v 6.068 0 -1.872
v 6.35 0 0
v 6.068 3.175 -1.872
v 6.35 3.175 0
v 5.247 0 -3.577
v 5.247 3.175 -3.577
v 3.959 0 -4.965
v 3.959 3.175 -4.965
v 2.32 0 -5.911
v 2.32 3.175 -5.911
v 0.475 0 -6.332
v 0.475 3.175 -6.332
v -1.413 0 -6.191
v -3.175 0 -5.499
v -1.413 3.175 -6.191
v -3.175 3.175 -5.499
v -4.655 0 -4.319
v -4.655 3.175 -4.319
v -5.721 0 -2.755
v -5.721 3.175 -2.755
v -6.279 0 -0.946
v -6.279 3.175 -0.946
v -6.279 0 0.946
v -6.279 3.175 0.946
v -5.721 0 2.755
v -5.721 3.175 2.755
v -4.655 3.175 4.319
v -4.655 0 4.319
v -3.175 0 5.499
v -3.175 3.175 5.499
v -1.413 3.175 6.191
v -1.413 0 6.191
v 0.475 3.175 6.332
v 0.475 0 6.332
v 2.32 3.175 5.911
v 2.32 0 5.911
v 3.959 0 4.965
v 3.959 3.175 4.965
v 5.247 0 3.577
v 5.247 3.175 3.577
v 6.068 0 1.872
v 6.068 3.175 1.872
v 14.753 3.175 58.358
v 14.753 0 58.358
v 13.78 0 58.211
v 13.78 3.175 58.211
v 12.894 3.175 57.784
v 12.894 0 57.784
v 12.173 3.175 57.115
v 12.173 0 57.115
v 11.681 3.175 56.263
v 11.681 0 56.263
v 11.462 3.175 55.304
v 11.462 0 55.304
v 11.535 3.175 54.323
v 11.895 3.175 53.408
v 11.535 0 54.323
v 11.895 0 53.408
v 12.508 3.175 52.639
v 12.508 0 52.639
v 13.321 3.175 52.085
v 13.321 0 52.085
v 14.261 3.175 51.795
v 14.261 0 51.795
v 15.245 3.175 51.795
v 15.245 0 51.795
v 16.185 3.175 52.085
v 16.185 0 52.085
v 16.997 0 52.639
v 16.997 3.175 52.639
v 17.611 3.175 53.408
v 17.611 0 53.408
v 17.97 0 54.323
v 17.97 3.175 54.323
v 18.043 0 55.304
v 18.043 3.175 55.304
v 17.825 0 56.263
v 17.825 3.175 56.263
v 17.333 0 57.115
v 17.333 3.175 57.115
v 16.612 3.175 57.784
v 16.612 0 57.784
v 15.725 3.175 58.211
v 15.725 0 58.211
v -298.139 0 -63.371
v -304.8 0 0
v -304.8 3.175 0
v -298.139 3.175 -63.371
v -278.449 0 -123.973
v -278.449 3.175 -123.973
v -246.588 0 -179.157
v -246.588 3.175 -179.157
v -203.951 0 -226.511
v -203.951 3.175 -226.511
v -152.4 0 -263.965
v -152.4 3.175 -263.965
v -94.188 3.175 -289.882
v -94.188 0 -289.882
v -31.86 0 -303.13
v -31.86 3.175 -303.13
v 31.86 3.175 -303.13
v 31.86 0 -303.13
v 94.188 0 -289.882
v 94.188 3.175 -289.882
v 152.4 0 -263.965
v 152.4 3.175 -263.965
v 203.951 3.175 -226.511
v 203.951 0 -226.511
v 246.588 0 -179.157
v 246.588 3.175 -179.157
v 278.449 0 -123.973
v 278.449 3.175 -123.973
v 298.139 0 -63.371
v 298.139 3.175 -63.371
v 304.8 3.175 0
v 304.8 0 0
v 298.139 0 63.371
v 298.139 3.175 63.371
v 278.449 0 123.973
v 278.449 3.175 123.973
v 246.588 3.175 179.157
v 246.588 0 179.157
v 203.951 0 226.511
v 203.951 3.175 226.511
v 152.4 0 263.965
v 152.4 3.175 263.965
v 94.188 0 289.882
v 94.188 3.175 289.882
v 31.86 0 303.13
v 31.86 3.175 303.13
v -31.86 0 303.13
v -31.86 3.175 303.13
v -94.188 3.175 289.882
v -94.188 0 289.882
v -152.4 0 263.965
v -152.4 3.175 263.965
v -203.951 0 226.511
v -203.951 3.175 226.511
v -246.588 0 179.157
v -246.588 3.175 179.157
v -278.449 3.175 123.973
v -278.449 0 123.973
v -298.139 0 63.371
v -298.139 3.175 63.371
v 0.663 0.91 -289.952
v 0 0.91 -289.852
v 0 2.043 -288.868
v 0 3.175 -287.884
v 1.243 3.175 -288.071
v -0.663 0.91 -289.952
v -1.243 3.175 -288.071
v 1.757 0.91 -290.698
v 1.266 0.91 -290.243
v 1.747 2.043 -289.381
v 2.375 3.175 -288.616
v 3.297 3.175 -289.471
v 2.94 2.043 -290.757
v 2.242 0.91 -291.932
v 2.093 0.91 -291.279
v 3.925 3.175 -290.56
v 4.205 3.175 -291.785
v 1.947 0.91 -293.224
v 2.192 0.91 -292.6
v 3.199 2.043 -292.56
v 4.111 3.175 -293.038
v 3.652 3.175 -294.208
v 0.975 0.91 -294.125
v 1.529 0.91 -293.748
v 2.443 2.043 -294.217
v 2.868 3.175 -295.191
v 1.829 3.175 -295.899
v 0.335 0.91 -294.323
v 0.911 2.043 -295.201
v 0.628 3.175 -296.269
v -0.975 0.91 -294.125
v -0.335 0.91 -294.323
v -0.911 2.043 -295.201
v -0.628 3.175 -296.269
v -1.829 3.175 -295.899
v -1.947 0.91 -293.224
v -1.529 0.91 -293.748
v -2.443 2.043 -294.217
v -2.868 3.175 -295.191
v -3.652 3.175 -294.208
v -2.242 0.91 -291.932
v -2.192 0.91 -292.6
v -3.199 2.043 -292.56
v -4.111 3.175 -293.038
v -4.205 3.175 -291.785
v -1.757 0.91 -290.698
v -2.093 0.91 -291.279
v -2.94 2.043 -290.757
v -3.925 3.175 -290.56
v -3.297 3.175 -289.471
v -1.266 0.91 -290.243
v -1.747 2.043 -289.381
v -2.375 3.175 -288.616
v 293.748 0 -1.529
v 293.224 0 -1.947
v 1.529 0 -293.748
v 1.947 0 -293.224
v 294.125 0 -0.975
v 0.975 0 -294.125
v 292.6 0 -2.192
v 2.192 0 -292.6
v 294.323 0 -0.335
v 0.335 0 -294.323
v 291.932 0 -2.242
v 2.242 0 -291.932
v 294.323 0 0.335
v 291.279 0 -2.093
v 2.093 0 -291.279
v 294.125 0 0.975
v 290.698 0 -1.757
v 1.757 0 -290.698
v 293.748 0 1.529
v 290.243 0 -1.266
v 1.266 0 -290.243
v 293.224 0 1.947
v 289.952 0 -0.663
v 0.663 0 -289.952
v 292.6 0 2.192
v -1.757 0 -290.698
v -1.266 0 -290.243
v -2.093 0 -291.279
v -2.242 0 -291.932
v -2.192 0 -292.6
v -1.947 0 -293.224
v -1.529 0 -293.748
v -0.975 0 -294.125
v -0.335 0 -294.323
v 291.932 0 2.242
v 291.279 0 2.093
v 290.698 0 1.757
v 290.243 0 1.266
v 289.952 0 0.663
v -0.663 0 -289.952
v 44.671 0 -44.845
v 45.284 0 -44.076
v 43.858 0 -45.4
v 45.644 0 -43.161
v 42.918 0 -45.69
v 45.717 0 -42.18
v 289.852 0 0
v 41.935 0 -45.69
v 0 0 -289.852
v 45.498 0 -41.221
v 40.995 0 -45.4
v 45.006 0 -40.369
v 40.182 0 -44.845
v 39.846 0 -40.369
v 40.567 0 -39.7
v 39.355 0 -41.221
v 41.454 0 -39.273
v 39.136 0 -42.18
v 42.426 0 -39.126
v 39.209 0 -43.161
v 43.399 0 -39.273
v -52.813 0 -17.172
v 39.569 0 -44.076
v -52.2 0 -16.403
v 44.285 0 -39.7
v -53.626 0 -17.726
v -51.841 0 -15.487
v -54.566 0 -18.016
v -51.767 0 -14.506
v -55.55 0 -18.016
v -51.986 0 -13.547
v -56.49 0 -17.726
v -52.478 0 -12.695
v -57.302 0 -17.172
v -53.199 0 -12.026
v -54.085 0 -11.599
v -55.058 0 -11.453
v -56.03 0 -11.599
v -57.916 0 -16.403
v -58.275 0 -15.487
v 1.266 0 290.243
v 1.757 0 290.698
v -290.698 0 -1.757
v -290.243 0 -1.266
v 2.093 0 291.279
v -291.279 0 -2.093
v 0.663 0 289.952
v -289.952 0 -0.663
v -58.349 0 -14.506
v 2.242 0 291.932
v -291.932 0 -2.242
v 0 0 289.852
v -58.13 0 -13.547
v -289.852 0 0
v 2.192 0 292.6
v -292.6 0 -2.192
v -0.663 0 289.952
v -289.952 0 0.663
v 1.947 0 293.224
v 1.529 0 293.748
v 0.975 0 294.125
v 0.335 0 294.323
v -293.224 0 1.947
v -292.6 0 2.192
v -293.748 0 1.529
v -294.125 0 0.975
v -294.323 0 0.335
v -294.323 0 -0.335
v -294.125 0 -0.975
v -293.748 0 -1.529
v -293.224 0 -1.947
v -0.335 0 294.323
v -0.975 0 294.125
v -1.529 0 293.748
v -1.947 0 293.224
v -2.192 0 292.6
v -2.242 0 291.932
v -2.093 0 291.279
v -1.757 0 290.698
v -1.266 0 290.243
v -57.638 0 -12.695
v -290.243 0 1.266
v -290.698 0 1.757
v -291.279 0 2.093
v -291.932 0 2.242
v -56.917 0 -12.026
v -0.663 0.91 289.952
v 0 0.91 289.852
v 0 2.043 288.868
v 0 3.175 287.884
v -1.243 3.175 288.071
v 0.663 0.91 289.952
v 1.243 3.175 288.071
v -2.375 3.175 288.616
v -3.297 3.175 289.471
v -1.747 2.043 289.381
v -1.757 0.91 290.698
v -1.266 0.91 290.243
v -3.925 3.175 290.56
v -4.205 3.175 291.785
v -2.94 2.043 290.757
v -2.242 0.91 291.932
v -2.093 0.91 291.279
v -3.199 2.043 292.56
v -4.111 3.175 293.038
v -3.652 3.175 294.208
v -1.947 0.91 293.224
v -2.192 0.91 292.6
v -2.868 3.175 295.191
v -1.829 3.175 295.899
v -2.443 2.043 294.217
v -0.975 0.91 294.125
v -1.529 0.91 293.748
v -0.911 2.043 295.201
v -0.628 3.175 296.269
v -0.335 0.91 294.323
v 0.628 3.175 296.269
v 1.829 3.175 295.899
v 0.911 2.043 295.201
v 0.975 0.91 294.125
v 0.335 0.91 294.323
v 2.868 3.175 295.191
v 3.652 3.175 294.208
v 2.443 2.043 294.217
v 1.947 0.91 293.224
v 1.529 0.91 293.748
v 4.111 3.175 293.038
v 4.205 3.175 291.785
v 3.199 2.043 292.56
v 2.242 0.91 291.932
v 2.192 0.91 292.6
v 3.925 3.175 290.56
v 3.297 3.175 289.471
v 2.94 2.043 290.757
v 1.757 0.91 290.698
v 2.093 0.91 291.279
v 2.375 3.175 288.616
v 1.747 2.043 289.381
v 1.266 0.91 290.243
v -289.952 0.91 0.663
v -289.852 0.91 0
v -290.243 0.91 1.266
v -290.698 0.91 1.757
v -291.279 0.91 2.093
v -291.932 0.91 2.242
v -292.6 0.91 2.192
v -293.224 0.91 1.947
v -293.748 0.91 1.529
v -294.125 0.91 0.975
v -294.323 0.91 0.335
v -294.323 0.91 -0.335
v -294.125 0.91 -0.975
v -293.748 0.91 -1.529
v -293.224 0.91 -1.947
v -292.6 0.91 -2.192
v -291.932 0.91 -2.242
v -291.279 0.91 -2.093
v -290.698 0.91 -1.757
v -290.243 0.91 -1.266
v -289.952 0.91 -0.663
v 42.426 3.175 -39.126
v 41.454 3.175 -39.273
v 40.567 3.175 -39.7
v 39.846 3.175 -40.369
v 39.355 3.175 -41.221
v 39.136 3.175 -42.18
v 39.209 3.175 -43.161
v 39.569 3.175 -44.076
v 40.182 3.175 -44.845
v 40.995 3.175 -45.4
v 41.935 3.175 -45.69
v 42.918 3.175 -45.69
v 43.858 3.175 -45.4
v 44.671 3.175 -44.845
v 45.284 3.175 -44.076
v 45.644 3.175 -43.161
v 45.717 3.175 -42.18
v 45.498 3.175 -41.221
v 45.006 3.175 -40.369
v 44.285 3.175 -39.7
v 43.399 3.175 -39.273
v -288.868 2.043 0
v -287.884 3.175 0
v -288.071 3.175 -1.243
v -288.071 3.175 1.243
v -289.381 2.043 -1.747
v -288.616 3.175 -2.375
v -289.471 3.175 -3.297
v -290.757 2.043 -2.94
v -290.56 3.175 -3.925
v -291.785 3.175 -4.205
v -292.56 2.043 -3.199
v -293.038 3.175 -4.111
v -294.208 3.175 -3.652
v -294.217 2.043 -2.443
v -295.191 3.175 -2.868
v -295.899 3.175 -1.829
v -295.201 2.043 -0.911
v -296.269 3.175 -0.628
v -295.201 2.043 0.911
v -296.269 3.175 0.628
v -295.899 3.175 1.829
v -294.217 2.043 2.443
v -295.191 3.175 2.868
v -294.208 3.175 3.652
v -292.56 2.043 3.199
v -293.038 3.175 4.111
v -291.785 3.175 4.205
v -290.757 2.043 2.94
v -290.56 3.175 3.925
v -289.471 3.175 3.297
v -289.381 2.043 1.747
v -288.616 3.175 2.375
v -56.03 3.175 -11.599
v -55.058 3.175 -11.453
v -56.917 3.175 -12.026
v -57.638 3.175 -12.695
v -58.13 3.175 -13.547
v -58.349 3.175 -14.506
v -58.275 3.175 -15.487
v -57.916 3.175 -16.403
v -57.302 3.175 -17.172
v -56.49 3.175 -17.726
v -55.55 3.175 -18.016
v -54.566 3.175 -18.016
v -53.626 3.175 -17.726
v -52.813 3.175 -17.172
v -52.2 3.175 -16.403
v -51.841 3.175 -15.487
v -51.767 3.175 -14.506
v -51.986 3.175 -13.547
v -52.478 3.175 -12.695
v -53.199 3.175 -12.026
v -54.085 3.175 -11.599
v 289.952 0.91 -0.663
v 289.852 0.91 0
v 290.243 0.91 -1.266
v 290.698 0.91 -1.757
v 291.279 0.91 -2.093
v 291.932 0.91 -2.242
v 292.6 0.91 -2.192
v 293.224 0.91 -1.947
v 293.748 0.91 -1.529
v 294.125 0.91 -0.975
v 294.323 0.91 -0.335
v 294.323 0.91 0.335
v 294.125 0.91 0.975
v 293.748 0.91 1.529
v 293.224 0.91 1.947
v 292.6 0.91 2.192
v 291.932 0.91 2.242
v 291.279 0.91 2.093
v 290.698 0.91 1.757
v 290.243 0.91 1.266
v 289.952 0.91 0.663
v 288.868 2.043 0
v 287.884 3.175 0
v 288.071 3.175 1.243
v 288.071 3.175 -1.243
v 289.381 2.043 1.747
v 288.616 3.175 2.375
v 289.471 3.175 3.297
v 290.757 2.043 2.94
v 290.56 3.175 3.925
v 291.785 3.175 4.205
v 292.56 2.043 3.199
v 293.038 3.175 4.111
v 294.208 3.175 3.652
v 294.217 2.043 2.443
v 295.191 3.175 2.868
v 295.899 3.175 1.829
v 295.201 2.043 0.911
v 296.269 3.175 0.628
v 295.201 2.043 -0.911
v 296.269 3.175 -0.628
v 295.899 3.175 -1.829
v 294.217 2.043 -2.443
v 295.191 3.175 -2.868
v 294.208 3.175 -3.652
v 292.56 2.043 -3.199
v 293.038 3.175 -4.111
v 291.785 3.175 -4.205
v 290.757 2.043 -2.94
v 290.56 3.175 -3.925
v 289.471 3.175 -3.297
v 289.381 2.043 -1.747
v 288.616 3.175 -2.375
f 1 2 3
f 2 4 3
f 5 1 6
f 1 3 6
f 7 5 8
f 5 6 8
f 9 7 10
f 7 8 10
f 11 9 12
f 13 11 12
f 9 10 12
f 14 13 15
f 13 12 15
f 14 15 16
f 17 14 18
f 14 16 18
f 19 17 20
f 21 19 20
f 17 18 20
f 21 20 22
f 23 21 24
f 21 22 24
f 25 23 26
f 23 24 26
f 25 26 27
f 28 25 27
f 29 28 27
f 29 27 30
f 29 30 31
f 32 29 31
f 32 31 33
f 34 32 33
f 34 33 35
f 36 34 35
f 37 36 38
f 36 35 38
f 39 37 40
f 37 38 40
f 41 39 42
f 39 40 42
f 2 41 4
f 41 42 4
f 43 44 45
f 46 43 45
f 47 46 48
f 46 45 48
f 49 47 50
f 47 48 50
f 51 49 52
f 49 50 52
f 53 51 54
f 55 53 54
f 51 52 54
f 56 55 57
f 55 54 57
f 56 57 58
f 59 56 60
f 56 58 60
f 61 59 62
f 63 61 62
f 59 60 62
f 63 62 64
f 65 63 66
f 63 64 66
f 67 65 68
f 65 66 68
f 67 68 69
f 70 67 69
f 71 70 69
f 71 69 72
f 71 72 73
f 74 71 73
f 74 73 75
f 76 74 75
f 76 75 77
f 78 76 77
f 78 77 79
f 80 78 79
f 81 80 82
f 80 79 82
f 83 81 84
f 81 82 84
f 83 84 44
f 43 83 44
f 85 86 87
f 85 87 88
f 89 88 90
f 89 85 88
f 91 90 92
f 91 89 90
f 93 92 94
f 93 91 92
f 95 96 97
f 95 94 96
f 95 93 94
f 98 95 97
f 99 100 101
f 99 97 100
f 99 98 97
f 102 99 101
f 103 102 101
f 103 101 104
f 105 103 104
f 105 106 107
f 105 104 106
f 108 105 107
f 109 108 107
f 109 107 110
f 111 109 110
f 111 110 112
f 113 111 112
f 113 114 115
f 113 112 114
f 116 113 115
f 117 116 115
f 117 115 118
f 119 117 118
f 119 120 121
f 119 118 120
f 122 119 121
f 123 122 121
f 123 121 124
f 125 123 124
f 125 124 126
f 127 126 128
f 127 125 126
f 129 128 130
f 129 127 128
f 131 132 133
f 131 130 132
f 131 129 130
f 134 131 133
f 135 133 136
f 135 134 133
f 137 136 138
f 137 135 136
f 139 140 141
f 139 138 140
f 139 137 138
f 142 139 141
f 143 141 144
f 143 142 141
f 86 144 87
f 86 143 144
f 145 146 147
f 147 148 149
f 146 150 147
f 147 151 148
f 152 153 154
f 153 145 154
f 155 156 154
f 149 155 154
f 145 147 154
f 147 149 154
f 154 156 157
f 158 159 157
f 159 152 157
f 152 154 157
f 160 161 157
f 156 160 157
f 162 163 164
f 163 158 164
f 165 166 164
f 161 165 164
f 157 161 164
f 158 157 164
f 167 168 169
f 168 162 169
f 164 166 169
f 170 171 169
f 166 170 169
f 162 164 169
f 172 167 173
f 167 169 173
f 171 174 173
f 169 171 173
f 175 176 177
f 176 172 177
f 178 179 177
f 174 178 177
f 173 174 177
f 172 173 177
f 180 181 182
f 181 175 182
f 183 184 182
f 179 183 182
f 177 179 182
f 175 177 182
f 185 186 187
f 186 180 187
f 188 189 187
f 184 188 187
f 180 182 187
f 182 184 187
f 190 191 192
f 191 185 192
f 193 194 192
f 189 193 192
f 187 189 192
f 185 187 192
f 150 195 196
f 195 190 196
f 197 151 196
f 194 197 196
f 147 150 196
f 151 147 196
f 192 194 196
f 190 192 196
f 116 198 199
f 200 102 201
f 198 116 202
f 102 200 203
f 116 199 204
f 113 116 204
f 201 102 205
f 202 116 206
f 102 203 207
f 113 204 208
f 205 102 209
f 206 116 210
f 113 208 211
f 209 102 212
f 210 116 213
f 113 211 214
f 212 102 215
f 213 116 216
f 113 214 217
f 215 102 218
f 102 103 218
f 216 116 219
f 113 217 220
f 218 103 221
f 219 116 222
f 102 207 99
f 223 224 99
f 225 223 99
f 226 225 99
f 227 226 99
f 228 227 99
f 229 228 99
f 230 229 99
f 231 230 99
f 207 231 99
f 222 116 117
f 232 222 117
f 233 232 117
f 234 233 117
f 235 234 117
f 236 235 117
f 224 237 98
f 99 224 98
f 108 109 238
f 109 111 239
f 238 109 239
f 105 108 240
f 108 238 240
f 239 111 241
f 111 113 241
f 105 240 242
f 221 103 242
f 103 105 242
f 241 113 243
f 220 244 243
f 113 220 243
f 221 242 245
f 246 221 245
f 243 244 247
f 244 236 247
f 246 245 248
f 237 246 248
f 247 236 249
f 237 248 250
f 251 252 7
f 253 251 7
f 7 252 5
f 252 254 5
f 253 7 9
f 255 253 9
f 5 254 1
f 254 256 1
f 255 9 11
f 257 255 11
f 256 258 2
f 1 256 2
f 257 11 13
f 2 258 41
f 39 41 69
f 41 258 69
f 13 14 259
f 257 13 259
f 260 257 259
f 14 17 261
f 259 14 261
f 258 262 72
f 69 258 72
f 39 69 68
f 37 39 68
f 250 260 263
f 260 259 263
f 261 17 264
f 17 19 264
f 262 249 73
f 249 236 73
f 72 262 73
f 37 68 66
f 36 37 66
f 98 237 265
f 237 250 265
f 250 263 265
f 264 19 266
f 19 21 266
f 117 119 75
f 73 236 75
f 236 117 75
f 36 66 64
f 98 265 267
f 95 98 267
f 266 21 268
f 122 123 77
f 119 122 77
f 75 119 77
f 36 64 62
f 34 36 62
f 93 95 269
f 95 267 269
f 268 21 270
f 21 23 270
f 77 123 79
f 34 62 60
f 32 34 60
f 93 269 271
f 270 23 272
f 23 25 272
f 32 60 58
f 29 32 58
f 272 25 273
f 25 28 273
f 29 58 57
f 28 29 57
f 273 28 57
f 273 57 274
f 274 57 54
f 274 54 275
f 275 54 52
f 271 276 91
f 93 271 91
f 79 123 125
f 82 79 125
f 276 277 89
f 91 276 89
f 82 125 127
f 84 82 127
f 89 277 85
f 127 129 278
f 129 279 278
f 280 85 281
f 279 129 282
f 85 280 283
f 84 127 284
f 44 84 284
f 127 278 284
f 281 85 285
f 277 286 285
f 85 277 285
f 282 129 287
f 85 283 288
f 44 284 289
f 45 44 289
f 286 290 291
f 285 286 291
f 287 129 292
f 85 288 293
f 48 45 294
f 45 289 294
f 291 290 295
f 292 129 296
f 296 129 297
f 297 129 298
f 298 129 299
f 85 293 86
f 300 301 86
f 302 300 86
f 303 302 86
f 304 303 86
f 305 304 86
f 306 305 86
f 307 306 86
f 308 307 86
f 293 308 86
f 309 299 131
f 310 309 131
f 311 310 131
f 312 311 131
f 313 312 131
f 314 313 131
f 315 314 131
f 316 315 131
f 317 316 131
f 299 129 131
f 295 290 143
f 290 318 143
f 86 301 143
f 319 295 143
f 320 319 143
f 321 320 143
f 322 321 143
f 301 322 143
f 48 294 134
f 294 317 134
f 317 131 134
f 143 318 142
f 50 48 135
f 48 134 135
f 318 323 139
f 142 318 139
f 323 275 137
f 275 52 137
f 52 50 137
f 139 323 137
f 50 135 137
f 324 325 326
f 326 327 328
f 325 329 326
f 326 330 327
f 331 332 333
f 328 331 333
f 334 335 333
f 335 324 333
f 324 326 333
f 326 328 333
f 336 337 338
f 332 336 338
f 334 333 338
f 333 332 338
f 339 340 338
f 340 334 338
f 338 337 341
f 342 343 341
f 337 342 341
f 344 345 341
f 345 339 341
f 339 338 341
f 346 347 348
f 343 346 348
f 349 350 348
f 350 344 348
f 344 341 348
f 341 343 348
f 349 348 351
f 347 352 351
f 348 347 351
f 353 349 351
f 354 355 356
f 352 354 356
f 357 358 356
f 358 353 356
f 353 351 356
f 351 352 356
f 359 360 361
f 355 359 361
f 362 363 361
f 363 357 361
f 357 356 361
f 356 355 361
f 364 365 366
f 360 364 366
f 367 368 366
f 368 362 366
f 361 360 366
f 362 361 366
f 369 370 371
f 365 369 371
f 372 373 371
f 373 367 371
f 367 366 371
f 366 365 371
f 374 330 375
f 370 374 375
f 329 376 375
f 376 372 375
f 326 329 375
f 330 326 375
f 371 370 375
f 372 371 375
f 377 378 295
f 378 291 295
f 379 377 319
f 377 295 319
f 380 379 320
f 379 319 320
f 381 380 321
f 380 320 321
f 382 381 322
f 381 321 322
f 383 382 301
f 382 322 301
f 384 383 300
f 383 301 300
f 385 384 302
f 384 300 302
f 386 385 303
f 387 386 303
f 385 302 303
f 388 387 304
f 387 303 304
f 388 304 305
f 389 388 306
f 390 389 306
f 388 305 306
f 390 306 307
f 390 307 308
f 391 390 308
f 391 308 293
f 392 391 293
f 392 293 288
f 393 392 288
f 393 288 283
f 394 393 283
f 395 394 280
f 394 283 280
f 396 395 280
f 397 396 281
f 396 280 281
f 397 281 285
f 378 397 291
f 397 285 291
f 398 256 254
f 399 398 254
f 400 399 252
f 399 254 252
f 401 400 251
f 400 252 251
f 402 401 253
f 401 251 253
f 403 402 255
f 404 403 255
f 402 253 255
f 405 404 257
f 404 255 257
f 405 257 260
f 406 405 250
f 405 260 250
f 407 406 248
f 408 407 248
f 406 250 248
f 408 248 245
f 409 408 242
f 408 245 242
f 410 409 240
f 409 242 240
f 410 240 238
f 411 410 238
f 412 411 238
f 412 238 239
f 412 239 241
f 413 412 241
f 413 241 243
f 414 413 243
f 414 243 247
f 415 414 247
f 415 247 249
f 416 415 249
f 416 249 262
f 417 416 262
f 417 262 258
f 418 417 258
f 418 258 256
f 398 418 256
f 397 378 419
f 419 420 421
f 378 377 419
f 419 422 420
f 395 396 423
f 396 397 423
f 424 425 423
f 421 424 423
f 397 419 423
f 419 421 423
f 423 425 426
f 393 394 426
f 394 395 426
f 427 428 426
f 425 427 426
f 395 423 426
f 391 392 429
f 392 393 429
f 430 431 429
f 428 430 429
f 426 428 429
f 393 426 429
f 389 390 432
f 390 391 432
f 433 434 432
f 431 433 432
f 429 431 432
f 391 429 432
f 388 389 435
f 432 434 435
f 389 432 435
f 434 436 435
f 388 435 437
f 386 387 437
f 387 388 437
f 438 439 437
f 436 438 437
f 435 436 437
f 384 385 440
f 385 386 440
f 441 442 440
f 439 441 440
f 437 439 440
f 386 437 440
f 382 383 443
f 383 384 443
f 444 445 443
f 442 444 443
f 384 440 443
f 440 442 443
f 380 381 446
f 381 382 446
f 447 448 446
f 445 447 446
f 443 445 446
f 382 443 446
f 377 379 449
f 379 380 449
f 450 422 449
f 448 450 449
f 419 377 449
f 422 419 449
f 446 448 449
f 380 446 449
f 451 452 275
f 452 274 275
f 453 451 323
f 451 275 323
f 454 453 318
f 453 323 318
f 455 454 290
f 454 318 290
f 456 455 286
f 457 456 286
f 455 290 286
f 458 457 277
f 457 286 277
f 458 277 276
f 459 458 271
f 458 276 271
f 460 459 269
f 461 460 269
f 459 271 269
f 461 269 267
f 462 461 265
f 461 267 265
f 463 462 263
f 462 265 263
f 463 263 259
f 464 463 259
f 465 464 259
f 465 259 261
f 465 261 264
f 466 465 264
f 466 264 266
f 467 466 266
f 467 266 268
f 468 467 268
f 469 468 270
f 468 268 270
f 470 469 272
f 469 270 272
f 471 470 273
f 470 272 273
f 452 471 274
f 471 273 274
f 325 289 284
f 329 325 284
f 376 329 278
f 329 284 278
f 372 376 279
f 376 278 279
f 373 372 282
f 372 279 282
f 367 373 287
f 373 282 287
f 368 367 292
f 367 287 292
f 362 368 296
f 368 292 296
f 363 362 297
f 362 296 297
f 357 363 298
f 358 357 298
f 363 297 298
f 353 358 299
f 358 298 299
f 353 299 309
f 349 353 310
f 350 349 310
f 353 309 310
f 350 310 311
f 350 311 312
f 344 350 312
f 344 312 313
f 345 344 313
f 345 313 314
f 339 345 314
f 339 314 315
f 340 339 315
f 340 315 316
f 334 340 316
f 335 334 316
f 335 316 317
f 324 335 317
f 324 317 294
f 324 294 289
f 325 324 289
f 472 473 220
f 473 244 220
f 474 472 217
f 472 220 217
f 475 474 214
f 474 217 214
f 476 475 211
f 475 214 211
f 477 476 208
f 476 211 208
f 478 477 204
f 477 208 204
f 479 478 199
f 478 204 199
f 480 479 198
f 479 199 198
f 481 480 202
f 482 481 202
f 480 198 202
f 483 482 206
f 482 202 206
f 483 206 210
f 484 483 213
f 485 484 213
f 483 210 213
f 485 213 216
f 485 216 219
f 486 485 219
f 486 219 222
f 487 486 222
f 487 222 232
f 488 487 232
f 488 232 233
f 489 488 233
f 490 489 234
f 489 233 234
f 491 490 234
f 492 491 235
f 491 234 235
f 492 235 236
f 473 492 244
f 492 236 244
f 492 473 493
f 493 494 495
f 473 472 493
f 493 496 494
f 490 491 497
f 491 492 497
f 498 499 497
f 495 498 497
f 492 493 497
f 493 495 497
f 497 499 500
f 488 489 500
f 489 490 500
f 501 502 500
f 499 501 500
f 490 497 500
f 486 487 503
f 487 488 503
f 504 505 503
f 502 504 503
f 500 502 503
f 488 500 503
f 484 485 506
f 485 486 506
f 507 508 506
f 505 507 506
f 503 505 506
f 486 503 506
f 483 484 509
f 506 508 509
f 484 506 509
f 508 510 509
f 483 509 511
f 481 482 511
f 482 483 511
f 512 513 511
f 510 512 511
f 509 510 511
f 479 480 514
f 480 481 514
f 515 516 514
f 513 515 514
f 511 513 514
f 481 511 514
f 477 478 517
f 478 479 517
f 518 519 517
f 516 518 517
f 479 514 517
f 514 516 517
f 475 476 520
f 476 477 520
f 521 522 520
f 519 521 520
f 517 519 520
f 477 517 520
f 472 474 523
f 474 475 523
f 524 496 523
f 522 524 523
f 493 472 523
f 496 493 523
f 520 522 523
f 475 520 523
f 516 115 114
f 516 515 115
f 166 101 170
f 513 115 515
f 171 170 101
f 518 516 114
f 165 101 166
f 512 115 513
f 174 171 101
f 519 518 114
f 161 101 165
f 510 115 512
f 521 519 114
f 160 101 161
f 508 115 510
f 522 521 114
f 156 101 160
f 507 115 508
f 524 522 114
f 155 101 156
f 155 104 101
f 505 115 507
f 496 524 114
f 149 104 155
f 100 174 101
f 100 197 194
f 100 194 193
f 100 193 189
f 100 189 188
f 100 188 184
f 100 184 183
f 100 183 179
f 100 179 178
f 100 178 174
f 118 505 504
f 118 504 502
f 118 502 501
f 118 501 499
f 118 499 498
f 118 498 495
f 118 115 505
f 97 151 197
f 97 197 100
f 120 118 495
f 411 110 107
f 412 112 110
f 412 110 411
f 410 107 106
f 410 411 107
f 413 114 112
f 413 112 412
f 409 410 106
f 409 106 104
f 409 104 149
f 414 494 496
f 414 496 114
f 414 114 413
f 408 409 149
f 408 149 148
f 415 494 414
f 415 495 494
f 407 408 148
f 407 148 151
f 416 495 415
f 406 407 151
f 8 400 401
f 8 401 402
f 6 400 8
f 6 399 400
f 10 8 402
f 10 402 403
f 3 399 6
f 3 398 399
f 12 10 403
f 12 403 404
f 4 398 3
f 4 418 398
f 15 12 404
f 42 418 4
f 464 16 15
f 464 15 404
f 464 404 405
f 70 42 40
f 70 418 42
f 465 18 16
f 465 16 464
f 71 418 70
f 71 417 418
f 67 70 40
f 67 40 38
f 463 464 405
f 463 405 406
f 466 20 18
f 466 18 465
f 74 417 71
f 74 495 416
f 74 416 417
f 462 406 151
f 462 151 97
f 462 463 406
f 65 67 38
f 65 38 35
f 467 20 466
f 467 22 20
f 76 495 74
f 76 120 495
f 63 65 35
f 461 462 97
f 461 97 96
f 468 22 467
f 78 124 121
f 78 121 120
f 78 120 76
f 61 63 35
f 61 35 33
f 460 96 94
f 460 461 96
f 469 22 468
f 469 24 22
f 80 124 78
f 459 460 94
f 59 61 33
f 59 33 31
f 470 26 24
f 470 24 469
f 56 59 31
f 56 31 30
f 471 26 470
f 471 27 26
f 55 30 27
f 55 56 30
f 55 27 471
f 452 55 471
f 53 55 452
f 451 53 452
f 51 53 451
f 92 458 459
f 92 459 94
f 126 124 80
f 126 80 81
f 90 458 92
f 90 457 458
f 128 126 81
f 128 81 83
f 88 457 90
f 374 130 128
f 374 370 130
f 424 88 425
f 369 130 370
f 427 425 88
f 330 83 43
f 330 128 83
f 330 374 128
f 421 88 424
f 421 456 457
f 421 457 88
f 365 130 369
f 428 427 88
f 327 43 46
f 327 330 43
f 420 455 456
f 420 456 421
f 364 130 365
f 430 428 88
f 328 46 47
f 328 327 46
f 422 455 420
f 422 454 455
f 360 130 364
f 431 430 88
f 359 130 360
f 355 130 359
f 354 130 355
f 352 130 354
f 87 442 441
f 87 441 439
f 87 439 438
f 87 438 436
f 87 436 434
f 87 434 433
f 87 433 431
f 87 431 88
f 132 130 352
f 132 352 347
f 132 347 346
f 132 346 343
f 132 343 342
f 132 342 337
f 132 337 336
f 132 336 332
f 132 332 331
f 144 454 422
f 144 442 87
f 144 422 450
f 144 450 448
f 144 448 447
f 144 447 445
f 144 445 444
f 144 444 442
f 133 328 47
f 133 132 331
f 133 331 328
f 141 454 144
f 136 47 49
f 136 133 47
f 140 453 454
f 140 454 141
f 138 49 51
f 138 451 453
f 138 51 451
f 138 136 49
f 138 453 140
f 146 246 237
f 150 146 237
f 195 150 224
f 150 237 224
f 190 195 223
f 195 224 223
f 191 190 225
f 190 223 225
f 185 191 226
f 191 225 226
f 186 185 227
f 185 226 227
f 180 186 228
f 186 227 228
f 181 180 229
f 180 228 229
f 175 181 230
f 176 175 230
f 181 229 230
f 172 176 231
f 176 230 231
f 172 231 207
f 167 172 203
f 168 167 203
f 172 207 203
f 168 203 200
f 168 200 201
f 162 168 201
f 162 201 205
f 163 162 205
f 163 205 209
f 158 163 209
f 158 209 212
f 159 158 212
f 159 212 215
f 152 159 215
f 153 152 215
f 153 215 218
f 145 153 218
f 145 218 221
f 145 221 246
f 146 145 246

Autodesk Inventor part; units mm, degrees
ref_plane "YZ Plane" through (0, 0, 0) normal (1, 0, 0) x (0, 1, 0)
ref_plane "XZ Plane" through (0, 0, 0) normal (0, 1, 0) x (-1, 0, 0)
ref_plane "XY Plane" through (0, 0, 0) normal (0, 0, 1) x (1, 0, 0)
sketch "Sketch1" plane through (0, 0, 0) normal (0, 1, 0) x (-1, 0, 0)
  circle A0 centre (0, 0) radius 304.8
  dimension "d0" = 609.6
extrude "Extrusion1" add sketch "Sketch1" along normal blind 3.175
sketch "Sketch2" plane through (0, 3.175, 0) normal (0, 1, 0) x (1, 0, 0)
  circle A0 centre (0, 0) radius 304.8 projected
  circle A1 centre (0, 0) radius 6.35
  dimension "d3" = 12.7
extrude "Extrusion2" cut sketch "Sketch2" against normal blind 3.175 contours A1
sketch "Sketch3" plane through (0, 3.175, 0) normal (0, 1, 0) x (1, 0, 0)
  circle A0 centre (0, 0) radius 6.35 projected
  circle A1 centre (0, 292.1) radius 4.6302
  dimension "d6" = 292.1
hole "Hole1" at (0, 3.175, -292.1) direction (0, -1, 0) diameter 4.4958 end through all countersink diameter 8.4328 countersink angle 82
pattern_circular "Circular Pattern1" count 4 over 360 about axis through (0, 3.175, 0) along (0, -1, 0) of "Hole1"
sketch "Sketch9" plane through (0, 3.175, 0) normal (0, 1, 0) x (1, 0, 0)
  circle A0 centre (0, 0) radius 304.8 projected
  line L0 (0, 0) -> (14.7527, -55.0578) construction
  line L1 (0, 0) -> (57, 0) construction
  line L2 (0, 0) -> (-55.0578, 14.7527) construction
  line L3 (0, 0) -> (57, 0) construction
  circle A1 centre (42.4264, 42.4264) radius 7.377
  circle A2 centre (14.7527, -55.0578) radius 7.6366
  circle A3 centre (-55.0578, 14.7527) radius 7.2502
  circle A4 centre (0, 0) radius 6.35 projected
  line L4 (0, 0) -> (42.4264, 42.4264) construction
  line L5 (0, 0) -> (60, 0) construction
  dimension "d85" = 57
  dimension "d86" = 75
  dimension "d87" = 57
  dimension "d88" = 195
  dimension "d96" = 60
  dimension "d97" = 45
hole "Hole7" at (-55.0578, 3.175, -14.7527) at (42.4264, 3.175, -42.4264) at (14.7527, 3.175, 55.0578) direction (0, -1, 0) diameter 6.6 end through all clearance for "Flat Head Machine Screw" size "M6" standard "Ansi Metric M Profile"
properties part number "2f1bd" material "Aluminum 6061"
